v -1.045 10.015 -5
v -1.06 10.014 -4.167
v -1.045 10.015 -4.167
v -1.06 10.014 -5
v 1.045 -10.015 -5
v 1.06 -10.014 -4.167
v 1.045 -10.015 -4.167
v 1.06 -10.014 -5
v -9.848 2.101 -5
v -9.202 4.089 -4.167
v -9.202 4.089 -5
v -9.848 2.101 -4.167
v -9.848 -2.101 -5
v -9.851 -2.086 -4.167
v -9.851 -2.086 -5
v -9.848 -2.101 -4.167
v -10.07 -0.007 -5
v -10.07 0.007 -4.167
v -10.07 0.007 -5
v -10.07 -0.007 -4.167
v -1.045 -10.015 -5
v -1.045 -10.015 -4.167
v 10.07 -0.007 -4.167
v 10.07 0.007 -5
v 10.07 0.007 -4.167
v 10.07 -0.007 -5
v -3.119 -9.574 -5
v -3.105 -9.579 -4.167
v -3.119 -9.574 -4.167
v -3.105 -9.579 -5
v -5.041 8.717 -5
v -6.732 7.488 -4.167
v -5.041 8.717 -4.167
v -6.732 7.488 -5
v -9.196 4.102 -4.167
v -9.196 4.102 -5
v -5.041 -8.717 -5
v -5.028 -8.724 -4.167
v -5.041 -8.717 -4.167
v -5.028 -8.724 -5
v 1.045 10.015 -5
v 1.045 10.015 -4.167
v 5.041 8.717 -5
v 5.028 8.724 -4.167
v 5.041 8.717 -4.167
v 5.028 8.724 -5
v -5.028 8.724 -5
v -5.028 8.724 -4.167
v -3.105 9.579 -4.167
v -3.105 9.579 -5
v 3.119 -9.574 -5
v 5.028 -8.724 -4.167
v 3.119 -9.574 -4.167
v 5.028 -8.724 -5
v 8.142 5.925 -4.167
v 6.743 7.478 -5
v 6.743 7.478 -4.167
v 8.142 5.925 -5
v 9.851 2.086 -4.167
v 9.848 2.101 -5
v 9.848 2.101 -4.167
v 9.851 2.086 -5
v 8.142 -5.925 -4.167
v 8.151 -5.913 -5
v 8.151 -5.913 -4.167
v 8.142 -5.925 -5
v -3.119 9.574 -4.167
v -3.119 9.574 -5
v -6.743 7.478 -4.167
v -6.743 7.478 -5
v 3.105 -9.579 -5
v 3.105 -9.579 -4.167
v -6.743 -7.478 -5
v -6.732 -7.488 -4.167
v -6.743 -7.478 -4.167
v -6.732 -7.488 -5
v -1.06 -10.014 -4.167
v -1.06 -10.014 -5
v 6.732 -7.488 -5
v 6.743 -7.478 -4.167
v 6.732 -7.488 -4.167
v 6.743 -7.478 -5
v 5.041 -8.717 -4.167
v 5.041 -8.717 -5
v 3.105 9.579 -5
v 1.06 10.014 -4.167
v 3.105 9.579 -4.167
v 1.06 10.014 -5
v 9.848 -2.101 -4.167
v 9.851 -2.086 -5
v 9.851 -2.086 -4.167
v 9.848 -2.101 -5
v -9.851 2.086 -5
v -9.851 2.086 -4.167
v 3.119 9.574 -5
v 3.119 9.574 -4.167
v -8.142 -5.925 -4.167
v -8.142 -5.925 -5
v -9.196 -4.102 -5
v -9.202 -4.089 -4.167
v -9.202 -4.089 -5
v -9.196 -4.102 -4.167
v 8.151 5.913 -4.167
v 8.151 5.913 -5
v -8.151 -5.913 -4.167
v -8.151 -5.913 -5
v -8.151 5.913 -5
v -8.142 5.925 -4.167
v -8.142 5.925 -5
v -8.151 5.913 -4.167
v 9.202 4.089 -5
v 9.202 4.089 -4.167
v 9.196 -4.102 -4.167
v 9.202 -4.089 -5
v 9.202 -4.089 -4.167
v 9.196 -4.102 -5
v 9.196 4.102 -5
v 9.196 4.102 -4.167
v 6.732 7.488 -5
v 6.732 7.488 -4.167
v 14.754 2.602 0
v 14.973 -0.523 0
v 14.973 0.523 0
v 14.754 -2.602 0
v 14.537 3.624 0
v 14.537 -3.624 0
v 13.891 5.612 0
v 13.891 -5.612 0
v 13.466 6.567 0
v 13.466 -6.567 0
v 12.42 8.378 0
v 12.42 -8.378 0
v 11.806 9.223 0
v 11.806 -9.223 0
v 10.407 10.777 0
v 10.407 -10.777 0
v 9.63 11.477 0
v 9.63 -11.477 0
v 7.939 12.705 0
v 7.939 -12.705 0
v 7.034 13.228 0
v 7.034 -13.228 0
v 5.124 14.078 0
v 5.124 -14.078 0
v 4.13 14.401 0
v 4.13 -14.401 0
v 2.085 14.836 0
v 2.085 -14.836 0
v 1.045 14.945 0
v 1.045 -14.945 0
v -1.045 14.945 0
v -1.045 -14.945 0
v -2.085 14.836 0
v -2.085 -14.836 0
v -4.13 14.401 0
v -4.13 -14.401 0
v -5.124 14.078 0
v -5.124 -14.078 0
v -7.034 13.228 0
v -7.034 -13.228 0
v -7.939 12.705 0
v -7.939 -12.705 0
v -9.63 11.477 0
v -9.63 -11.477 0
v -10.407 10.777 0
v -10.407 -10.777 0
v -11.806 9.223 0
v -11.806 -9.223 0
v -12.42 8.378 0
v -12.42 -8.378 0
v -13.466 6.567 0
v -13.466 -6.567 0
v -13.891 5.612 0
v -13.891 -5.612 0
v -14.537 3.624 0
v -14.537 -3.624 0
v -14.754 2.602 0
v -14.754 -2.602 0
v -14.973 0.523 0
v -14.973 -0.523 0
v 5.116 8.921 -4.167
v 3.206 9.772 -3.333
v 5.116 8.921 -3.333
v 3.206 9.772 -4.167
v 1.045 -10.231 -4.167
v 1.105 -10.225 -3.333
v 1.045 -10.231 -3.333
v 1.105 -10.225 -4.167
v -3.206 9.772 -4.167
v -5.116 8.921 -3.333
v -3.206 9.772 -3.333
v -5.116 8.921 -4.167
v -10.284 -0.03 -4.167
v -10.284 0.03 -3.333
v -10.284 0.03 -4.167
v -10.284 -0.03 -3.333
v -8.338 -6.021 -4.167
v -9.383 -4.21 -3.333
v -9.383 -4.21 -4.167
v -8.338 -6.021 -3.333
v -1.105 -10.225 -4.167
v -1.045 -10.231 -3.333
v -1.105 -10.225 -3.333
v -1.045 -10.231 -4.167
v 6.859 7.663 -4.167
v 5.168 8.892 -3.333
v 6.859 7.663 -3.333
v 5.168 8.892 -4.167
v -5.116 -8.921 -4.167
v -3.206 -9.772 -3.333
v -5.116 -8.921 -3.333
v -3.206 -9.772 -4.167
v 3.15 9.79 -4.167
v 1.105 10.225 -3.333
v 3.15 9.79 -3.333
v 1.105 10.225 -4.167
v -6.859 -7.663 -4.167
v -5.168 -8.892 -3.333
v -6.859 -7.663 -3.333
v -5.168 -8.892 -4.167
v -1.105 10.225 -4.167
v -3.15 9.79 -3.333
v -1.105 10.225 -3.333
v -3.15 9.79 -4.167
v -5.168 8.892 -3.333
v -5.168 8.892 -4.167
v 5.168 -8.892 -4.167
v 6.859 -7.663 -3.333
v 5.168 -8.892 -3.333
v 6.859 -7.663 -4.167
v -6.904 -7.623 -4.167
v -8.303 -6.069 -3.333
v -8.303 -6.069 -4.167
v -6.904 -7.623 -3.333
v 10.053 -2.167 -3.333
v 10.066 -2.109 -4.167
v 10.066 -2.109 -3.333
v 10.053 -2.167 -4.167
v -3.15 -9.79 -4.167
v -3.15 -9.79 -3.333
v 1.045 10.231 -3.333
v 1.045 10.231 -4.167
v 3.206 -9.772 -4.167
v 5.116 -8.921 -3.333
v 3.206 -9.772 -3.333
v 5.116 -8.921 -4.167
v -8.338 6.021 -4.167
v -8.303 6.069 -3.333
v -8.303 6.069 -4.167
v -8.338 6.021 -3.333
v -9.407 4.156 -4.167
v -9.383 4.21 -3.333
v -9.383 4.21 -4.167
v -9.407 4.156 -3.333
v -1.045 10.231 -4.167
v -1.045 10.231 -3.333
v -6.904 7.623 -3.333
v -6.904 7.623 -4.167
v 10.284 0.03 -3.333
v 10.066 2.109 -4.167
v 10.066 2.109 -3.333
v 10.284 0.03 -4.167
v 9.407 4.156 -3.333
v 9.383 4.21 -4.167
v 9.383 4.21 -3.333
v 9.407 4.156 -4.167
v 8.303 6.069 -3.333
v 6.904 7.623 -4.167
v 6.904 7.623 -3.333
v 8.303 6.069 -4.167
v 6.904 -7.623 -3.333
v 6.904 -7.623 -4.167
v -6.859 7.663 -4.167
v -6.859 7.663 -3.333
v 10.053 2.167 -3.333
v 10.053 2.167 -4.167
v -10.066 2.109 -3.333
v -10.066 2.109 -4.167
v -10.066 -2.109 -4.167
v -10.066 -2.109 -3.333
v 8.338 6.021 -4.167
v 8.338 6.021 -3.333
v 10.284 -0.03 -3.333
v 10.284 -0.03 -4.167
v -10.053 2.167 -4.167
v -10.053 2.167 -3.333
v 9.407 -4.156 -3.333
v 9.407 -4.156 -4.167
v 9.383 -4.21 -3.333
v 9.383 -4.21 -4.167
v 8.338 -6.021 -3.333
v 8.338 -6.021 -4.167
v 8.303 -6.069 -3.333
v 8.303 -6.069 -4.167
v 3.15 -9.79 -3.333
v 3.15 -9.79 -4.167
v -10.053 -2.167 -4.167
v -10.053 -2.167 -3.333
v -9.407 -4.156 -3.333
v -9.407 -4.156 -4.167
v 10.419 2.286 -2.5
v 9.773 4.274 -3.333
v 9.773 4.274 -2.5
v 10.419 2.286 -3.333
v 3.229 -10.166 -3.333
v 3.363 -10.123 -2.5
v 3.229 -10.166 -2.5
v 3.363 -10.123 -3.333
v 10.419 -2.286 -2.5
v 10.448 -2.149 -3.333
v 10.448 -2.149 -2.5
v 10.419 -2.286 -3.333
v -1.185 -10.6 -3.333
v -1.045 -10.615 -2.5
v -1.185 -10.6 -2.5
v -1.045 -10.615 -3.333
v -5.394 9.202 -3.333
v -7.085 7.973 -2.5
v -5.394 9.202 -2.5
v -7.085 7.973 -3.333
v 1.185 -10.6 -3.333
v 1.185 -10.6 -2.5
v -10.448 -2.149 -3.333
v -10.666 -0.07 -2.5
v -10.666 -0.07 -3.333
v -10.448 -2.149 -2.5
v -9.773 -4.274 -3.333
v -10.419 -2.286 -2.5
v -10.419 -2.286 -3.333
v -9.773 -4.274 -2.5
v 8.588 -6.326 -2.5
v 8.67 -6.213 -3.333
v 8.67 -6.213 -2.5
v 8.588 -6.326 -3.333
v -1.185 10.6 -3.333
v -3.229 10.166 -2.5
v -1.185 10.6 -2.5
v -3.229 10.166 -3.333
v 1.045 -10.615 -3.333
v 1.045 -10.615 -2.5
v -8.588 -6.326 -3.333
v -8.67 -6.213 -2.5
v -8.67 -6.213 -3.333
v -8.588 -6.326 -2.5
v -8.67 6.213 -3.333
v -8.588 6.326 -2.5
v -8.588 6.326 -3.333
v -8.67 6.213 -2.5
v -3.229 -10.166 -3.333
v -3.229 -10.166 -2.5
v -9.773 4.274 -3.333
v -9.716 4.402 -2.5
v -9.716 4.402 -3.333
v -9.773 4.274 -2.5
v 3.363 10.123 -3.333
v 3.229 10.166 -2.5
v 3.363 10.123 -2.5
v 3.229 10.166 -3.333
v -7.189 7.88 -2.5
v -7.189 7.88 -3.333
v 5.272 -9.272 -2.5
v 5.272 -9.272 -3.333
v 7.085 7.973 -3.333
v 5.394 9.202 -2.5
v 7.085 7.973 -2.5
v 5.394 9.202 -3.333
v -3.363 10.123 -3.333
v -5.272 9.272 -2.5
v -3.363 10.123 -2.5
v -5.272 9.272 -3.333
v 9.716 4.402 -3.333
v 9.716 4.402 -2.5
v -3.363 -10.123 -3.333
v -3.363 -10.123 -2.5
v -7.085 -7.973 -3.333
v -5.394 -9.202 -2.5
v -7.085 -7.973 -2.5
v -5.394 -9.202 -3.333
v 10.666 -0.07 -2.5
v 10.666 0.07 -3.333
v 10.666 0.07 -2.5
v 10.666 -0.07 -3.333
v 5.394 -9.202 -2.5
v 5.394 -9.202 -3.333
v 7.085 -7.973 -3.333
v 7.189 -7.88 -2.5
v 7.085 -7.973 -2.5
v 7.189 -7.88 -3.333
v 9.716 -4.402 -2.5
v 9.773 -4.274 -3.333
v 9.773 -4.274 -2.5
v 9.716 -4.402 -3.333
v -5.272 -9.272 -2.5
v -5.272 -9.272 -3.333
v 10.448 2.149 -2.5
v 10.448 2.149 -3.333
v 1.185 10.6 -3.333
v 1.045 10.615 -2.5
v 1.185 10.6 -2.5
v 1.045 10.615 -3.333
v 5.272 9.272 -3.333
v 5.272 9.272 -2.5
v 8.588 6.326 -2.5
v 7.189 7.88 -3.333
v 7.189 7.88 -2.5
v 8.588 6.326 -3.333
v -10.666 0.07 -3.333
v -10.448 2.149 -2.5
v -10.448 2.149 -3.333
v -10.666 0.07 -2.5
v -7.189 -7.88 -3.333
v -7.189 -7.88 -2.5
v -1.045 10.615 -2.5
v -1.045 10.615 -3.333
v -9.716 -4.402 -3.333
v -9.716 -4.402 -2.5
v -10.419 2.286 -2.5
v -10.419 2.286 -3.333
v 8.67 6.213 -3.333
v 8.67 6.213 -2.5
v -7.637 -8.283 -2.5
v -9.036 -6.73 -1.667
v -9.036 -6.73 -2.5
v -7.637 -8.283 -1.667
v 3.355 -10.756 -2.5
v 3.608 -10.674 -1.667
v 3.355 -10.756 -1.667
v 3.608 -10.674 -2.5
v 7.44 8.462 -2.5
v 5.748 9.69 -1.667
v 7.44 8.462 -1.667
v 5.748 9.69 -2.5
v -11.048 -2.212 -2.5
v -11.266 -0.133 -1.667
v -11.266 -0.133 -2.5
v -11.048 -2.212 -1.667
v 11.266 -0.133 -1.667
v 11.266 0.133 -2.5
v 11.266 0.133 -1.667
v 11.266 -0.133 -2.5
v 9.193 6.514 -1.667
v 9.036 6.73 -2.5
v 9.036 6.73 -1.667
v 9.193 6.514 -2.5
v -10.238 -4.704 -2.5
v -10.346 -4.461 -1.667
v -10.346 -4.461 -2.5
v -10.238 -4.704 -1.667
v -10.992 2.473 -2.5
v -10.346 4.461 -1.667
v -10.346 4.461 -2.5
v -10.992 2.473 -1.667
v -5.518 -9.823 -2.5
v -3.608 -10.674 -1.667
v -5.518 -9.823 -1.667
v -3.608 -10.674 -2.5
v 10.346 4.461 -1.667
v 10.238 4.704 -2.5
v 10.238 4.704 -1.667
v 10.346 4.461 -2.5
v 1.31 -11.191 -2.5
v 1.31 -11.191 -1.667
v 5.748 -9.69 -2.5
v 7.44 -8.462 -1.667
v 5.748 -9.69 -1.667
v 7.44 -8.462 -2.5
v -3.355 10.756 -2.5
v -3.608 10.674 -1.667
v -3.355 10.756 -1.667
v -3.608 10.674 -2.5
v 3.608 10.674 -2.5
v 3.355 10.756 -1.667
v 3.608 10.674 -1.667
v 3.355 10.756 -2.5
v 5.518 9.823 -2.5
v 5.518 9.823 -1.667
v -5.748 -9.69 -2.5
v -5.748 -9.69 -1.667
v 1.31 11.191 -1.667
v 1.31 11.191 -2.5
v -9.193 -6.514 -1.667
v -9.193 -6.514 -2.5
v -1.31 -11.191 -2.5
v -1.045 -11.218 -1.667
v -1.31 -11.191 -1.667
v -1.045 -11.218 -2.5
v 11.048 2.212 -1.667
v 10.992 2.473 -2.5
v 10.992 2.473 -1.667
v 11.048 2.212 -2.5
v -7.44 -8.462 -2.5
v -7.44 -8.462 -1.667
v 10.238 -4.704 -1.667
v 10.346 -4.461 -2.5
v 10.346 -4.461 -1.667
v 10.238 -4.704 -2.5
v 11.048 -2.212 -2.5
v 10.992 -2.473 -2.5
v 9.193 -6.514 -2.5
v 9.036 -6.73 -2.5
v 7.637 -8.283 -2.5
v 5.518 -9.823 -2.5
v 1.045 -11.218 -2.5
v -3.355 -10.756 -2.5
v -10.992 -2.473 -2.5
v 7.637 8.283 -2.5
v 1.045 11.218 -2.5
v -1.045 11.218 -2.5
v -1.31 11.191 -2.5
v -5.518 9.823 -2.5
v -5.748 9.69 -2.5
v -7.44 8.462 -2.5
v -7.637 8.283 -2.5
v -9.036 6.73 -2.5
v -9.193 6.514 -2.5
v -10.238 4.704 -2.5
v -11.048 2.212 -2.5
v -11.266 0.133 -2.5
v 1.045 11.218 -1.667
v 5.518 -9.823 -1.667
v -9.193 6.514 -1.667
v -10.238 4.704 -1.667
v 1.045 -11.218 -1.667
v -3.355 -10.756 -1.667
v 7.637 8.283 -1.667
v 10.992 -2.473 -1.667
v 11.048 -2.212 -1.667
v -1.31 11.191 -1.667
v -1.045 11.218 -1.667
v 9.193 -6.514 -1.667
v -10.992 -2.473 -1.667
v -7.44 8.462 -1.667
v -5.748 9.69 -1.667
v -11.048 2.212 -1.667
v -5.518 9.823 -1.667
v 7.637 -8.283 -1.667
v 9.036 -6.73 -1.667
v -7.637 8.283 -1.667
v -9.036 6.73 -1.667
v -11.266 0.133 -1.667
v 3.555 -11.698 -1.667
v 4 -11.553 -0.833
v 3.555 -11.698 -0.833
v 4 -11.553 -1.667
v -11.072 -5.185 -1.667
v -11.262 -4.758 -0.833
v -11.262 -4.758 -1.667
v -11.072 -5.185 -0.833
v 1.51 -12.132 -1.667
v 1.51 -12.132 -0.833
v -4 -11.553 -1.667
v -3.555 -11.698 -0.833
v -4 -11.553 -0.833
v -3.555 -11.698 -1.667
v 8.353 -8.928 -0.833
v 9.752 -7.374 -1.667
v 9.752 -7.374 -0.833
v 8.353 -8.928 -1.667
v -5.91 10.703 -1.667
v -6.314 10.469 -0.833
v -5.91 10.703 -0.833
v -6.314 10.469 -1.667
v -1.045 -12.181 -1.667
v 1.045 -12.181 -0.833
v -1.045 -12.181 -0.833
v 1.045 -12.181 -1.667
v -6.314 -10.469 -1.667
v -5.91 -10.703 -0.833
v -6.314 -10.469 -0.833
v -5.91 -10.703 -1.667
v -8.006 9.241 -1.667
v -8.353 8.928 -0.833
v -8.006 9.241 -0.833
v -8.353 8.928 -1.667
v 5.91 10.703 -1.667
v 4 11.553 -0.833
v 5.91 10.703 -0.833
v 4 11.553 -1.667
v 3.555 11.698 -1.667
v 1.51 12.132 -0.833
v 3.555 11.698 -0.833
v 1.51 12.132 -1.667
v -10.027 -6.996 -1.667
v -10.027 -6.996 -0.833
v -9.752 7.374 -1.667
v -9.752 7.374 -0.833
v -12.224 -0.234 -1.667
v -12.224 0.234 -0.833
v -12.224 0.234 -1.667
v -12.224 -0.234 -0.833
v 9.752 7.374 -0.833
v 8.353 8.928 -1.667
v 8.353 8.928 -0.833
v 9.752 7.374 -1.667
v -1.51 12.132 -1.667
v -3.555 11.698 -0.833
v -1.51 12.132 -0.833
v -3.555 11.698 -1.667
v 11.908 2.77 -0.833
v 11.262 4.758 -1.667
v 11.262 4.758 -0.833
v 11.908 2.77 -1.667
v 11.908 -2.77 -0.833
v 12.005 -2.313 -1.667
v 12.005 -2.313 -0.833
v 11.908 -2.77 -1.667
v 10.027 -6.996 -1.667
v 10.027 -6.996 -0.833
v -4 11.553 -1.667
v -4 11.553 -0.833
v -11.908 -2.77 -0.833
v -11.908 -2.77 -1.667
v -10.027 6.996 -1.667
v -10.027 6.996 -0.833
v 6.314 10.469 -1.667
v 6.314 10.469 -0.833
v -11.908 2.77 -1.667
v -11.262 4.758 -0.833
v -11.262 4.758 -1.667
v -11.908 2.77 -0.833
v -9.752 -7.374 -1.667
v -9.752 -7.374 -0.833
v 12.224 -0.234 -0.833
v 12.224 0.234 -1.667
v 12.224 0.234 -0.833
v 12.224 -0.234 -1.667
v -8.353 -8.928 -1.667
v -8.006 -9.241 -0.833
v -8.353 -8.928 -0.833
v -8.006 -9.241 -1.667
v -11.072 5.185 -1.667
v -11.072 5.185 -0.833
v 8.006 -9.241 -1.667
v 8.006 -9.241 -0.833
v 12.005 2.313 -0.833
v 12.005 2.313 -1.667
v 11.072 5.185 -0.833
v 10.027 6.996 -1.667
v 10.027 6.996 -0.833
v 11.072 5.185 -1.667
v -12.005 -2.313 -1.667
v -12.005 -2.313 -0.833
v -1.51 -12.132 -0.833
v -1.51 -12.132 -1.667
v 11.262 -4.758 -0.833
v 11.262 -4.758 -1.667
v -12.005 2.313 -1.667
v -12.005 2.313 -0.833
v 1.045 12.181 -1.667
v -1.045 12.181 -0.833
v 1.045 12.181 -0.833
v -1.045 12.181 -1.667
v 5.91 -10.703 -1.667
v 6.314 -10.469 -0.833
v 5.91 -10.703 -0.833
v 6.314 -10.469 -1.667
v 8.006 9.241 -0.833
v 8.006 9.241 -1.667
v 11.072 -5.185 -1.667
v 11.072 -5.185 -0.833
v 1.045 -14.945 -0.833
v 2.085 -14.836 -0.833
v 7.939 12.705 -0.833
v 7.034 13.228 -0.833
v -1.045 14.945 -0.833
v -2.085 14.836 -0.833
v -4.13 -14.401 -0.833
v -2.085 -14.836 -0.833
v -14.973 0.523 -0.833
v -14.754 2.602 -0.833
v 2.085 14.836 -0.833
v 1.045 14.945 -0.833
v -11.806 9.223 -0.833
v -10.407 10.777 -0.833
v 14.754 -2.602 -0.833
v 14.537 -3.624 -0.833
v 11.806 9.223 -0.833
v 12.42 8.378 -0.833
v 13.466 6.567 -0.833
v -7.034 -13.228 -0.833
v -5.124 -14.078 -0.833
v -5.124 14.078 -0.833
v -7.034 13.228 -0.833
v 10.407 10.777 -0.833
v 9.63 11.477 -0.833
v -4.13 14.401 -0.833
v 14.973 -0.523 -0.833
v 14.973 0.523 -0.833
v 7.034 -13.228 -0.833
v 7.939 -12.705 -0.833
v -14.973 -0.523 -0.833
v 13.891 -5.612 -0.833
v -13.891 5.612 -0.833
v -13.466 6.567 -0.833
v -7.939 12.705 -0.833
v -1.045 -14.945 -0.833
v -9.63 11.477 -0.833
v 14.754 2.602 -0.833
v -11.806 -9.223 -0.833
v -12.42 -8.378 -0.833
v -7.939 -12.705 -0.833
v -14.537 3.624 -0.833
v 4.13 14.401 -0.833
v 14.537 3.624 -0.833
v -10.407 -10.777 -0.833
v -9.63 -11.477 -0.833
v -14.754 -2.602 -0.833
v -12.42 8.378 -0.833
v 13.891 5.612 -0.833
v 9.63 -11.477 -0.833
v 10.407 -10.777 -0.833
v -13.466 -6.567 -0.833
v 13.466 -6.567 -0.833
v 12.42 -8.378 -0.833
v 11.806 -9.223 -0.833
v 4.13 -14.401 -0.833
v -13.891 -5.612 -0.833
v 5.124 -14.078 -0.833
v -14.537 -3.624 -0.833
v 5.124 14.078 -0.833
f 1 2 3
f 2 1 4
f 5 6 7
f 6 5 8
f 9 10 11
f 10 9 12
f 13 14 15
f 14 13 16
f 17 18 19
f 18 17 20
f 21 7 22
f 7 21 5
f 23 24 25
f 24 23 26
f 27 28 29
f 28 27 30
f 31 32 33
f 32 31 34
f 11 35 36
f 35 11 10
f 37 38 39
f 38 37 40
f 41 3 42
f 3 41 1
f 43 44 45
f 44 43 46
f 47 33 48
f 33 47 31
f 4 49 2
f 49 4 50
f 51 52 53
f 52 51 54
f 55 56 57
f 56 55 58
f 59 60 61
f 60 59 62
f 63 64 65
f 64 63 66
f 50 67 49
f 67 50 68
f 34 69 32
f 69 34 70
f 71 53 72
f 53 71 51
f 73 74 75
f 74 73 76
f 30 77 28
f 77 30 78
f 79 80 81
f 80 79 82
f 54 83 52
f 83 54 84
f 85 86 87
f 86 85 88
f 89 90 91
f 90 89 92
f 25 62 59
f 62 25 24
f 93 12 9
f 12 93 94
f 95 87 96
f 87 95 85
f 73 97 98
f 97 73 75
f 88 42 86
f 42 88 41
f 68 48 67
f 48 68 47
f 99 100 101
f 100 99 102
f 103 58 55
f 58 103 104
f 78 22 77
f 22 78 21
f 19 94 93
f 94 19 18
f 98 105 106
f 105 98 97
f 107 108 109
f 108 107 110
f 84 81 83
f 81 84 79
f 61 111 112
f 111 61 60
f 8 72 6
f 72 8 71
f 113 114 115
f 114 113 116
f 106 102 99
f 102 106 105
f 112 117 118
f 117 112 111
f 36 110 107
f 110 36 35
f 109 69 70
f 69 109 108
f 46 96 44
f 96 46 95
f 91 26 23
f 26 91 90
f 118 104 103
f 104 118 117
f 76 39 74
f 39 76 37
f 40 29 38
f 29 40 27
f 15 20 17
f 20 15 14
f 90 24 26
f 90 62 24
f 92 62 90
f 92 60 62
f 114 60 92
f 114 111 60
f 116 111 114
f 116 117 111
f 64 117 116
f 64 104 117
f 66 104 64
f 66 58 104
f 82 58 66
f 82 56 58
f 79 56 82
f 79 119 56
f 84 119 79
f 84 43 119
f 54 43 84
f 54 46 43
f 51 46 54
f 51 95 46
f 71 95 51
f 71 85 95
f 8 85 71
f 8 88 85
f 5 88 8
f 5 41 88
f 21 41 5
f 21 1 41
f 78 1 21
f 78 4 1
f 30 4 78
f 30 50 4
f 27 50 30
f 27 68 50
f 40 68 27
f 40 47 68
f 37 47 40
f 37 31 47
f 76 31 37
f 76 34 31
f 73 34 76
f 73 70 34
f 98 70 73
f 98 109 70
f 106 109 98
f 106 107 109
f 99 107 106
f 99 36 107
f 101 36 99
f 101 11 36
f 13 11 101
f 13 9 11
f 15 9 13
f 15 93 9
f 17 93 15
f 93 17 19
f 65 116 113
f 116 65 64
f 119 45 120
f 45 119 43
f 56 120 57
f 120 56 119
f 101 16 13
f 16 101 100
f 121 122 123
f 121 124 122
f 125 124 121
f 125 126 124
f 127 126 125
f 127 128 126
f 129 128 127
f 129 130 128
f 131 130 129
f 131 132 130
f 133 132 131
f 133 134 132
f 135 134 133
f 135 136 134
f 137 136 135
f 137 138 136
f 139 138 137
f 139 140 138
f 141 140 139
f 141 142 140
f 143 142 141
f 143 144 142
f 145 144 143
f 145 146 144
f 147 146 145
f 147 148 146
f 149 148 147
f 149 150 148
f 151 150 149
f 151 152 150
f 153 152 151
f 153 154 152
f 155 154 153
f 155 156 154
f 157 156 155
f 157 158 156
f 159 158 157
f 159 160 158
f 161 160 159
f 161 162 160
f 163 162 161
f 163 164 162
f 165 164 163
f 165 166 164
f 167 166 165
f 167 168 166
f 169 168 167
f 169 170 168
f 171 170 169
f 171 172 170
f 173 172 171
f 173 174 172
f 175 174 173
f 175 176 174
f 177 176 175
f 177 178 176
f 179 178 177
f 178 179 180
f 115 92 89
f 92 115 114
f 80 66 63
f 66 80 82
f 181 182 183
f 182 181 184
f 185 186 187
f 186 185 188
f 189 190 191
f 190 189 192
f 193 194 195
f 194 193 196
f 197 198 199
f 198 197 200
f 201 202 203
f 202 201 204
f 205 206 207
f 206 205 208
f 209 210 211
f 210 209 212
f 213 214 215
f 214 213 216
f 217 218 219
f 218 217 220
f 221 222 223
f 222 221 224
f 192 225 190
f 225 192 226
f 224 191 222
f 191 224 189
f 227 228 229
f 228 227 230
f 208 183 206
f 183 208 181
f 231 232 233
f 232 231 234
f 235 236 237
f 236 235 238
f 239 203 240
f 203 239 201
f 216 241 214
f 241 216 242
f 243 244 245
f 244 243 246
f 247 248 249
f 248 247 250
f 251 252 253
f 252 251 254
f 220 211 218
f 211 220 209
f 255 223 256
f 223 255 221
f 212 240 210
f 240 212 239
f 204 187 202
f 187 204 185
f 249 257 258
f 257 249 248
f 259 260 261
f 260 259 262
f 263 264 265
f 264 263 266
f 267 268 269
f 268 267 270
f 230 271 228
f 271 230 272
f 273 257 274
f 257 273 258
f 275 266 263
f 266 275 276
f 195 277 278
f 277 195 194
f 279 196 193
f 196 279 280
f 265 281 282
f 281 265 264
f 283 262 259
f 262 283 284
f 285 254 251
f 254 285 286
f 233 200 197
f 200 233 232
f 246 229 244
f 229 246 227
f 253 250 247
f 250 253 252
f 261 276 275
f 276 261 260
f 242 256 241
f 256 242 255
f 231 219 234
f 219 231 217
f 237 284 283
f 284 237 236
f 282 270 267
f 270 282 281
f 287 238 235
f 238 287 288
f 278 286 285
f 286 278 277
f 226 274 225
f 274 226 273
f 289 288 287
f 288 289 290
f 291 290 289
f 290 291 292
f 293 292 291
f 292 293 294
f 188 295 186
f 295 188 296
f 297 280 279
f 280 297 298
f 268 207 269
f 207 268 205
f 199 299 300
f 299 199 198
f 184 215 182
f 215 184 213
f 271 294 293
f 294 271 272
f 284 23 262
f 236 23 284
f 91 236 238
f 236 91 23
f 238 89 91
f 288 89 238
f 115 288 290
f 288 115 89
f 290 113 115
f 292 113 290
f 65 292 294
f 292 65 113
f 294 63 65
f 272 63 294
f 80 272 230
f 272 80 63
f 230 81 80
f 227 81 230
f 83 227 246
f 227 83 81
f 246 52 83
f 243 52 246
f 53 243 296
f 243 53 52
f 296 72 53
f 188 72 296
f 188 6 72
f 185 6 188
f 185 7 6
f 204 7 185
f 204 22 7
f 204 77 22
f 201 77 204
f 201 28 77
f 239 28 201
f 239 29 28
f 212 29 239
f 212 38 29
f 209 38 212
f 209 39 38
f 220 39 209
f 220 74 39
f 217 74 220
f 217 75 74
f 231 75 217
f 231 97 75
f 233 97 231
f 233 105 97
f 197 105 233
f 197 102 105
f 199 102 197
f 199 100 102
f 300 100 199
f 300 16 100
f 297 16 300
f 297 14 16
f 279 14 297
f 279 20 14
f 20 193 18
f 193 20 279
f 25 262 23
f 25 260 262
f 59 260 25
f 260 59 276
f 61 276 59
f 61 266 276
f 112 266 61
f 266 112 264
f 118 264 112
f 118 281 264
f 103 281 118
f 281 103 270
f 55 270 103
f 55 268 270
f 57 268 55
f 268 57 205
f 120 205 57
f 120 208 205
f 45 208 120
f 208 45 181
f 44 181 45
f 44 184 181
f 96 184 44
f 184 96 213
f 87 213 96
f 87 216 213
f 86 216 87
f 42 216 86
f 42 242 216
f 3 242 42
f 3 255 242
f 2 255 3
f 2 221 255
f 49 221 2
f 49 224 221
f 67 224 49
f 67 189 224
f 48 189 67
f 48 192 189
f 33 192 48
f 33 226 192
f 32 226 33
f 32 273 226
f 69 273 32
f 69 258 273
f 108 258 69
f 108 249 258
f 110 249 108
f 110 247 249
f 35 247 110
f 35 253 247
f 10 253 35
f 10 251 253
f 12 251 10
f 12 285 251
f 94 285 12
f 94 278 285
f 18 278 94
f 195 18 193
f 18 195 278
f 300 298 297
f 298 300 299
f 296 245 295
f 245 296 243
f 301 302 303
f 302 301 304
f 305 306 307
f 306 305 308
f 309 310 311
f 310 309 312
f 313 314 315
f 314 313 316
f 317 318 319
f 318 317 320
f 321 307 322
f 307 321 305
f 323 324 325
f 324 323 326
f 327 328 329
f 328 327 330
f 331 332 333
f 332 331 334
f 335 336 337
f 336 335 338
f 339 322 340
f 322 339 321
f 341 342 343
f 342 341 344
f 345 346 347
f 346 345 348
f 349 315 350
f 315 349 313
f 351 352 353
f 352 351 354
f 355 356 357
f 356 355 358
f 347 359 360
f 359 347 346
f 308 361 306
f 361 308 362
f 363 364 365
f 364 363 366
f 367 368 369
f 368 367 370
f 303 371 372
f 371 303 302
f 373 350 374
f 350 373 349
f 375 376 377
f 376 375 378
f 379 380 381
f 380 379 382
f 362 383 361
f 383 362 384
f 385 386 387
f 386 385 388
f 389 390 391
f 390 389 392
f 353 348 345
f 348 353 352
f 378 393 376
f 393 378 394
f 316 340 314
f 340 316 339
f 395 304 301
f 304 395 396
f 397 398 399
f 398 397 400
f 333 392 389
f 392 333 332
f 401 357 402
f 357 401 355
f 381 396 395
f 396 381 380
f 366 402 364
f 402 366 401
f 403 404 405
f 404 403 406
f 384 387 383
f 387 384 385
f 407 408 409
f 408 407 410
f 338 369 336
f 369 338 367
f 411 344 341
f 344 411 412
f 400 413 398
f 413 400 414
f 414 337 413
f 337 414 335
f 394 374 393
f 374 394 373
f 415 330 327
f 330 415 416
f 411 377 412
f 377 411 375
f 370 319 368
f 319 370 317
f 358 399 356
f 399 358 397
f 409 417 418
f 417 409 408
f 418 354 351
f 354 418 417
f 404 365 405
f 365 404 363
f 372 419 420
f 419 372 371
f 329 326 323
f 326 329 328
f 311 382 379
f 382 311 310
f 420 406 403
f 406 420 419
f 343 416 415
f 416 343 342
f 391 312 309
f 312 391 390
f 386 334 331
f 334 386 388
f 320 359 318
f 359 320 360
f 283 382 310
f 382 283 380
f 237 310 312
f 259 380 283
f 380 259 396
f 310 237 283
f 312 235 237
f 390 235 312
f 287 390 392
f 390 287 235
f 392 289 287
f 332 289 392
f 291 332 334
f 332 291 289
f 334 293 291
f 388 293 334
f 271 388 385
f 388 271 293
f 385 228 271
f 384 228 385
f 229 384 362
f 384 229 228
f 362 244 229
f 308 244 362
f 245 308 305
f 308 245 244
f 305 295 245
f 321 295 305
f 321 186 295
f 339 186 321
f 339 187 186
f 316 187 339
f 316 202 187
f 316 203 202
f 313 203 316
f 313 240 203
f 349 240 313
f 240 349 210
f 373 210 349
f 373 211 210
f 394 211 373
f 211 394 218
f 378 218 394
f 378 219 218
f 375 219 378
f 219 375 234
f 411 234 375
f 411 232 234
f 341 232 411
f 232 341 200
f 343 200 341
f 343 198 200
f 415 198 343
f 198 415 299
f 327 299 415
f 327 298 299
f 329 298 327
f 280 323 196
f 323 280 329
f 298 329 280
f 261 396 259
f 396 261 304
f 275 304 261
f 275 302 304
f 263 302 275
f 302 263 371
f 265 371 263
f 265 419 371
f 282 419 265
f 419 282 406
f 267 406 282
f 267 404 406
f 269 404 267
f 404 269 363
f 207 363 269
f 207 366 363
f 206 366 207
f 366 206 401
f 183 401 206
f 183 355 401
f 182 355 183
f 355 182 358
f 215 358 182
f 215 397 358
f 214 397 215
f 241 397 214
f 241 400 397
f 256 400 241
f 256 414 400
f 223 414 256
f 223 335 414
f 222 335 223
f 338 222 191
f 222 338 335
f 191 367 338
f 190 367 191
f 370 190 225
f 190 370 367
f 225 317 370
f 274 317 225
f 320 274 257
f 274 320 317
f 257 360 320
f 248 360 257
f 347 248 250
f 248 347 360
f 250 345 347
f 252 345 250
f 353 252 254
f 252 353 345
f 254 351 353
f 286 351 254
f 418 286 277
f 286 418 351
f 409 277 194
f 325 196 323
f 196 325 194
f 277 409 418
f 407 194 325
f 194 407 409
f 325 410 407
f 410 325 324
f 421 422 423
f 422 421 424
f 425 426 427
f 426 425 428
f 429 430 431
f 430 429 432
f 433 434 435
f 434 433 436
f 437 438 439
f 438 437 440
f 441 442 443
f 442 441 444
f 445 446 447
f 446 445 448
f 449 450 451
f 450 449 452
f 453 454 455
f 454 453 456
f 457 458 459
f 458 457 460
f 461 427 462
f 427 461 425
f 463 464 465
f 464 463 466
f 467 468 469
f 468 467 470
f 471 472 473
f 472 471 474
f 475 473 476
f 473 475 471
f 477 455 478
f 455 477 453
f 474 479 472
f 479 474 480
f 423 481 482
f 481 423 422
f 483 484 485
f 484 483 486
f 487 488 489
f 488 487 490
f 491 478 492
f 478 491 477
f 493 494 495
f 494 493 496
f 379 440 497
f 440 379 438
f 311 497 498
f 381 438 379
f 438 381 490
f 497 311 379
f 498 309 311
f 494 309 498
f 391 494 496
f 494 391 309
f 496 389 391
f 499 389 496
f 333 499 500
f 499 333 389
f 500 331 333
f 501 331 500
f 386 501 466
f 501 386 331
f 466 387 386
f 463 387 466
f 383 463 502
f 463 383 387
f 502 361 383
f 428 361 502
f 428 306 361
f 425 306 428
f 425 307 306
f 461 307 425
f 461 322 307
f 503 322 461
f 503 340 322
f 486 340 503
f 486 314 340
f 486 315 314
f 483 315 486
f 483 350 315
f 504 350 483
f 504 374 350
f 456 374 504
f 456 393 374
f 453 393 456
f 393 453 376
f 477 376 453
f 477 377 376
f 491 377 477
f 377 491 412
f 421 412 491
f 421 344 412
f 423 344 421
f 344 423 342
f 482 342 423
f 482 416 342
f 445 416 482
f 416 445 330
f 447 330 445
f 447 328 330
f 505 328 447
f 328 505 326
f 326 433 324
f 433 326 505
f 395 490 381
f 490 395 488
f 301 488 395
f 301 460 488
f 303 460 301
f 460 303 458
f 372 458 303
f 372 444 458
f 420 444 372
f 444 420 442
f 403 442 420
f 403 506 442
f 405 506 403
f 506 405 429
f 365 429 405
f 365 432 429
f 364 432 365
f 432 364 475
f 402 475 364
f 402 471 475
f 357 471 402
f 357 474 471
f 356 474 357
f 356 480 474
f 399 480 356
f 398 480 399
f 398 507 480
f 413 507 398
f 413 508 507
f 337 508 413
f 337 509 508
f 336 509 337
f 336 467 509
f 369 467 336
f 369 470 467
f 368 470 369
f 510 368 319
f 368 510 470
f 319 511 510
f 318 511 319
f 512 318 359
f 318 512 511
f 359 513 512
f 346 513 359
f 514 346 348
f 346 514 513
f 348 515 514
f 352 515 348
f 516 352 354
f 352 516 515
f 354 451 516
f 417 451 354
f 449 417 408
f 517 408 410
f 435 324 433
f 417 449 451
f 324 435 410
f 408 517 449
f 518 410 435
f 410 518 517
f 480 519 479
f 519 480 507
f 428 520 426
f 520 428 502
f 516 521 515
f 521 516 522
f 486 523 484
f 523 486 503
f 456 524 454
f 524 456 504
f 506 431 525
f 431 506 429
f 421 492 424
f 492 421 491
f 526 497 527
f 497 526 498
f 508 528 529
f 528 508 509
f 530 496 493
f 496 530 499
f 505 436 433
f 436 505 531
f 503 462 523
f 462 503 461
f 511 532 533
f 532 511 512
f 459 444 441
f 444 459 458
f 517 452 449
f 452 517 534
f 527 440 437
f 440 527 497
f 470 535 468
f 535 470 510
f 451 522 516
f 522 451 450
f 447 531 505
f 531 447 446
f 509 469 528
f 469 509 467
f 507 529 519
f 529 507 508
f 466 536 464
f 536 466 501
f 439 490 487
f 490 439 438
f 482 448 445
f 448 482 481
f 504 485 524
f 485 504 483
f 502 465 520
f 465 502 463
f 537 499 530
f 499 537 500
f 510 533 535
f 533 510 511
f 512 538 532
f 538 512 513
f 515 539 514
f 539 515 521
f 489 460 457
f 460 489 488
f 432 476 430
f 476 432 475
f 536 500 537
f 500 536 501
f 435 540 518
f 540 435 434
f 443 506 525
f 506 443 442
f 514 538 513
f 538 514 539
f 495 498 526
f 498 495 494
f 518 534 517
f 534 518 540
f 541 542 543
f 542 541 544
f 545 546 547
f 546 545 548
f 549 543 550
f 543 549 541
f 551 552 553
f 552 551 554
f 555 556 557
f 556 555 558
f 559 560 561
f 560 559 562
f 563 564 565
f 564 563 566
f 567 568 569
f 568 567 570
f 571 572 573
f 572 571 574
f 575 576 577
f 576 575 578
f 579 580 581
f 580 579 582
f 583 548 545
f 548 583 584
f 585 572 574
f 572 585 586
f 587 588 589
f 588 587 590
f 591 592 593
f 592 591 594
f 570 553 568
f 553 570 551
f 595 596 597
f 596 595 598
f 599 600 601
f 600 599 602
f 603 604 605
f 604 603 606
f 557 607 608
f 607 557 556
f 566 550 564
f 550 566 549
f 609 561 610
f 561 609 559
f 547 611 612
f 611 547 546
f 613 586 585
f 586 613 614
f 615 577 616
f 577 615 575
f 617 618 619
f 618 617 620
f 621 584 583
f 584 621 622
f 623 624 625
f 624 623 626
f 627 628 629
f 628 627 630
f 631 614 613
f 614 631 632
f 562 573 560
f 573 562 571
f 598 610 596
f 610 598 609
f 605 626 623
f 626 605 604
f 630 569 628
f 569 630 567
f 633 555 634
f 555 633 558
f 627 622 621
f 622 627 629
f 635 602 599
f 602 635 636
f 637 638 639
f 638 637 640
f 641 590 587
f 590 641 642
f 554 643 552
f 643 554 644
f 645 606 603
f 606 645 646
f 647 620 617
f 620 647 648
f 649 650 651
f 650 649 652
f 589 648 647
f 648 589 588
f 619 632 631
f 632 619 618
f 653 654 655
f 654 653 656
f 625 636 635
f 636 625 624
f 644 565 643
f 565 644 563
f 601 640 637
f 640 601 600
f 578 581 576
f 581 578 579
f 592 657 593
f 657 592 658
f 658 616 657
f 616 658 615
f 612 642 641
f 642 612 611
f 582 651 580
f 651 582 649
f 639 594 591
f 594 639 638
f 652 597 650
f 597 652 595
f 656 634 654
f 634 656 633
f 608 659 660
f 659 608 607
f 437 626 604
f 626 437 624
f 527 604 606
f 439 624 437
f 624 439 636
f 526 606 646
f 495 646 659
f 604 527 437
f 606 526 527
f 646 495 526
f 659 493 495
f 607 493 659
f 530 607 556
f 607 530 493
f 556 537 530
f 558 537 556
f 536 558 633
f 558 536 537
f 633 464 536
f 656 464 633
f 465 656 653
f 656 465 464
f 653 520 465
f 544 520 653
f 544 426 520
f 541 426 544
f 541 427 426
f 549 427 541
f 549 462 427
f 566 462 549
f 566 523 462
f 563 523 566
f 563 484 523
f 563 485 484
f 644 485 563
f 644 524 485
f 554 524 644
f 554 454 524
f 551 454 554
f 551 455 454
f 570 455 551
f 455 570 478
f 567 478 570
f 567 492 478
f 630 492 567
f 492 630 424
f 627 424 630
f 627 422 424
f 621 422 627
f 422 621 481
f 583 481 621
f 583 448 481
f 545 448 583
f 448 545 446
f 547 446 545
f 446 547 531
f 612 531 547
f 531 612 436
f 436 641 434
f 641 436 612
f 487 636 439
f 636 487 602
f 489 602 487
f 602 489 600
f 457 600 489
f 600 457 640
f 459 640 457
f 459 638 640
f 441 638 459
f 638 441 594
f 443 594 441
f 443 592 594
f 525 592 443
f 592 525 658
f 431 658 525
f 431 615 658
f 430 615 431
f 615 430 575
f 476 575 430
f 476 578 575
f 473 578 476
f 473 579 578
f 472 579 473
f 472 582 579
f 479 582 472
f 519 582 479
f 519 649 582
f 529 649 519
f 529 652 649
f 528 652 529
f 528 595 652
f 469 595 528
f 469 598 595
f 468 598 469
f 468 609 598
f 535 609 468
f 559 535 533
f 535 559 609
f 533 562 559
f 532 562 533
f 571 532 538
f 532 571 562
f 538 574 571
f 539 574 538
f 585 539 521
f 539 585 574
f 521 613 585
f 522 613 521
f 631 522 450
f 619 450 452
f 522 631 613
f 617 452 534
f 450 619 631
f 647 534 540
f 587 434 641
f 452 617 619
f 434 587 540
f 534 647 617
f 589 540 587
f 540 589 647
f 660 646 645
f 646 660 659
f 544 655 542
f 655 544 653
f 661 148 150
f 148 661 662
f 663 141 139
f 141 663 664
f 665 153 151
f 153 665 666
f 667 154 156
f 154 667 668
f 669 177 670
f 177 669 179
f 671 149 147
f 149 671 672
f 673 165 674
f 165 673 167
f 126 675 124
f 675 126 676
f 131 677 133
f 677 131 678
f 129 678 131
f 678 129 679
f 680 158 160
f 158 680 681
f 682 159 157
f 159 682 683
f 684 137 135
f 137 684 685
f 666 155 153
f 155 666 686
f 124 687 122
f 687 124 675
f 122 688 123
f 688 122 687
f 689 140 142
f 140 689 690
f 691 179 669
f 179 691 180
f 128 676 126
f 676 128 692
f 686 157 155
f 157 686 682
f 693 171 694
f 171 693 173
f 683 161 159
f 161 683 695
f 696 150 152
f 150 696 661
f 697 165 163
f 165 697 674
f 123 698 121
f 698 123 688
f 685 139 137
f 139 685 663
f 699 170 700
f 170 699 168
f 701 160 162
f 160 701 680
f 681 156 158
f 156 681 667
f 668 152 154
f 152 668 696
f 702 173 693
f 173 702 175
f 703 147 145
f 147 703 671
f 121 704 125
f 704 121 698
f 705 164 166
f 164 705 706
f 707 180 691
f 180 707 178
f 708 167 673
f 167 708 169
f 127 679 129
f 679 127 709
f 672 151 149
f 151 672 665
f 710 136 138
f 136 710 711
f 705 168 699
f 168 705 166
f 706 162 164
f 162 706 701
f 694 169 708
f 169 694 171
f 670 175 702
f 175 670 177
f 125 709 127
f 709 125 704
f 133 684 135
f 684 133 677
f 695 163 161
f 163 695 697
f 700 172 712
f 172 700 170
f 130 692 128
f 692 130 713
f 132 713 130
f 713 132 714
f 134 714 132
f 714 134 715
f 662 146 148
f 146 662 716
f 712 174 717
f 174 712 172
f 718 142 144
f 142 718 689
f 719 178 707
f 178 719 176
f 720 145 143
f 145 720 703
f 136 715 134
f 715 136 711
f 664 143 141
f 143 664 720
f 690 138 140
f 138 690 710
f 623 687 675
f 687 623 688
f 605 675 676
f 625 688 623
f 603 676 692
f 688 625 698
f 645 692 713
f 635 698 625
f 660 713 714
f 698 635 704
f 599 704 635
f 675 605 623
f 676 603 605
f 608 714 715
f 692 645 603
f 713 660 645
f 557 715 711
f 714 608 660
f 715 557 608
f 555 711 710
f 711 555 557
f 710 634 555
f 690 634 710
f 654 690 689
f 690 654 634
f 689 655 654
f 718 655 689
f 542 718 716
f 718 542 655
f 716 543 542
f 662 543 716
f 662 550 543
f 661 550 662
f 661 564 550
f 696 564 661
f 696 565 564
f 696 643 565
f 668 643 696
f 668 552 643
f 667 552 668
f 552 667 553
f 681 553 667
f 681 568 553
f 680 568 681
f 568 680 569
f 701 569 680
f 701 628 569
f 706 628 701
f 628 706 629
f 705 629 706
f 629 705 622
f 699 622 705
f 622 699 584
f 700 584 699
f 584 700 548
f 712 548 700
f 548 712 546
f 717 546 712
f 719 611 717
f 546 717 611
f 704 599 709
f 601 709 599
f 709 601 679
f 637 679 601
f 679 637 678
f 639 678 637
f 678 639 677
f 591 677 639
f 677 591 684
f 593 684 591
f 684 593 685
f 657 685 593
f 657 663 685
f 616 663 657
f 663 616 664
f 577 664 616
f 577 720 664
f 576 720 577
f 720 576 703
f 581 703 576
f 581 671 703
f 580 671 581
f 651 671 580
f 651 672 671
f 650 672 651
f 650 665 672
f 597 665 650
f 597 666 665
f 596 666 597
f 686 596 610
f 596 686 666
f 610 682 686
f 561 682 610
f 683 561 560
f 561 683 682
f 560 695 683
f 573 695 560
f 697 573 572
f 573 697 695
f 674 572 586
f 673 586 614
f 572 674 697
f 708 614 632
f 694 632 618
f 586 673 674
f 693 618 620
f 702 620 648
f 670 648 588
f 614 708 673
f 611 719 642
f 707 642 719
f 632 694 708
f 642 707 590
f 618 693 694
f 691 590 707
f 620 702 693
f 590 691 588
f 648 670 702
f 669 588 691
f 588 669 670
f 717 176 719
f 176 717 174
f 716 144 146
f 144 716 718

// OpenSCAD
union() {
    union() {
        translate(v=[0, 0, -5]) {
            linear_extrude(height=5) {
                offset(r=0.06993351408365323) {
                    circle(r=10);
                };
            };
        };
        translate(v=[0, 0, -4.166666666666667]) {
            linear_extrude(height=4.166666666666667) {
                offset(r=0.2859547920896832) {
                    circle(r=10);
                };
            };
        };
        translate(v=[0, 0, -3.333333333333333]) {
            linear_extrude(height=3.333333333333333) {
                offset(r=0.669872981077807) {
                    circle(r=10);
                };
            };
        };
        translate(v=[0, 0, -2.5]) {
            linear_extrude(height=2.5) {
                offset(r=1.2732200375003506) {
                    circle(r=10);
                };
            };
        };
        translate(v=[0, 0, -1.6666666666666665]) {
            linear_extrude(height=1.6666666666666665) {
                offset(r=2.236146008037167) {
                    circle(r=10);
                };
            };
        };
        translate(v=[0, 0, -0.833333333333333]) {
            linear_extrude(height=0.833333333333333) {
                offset(r=5) {
                    circle(r=10);
                };
            };
        };
    };
    %translate(v=[0, 0, -5]) {
        cylinder(r=10, h=10, center=true);
    };
};
